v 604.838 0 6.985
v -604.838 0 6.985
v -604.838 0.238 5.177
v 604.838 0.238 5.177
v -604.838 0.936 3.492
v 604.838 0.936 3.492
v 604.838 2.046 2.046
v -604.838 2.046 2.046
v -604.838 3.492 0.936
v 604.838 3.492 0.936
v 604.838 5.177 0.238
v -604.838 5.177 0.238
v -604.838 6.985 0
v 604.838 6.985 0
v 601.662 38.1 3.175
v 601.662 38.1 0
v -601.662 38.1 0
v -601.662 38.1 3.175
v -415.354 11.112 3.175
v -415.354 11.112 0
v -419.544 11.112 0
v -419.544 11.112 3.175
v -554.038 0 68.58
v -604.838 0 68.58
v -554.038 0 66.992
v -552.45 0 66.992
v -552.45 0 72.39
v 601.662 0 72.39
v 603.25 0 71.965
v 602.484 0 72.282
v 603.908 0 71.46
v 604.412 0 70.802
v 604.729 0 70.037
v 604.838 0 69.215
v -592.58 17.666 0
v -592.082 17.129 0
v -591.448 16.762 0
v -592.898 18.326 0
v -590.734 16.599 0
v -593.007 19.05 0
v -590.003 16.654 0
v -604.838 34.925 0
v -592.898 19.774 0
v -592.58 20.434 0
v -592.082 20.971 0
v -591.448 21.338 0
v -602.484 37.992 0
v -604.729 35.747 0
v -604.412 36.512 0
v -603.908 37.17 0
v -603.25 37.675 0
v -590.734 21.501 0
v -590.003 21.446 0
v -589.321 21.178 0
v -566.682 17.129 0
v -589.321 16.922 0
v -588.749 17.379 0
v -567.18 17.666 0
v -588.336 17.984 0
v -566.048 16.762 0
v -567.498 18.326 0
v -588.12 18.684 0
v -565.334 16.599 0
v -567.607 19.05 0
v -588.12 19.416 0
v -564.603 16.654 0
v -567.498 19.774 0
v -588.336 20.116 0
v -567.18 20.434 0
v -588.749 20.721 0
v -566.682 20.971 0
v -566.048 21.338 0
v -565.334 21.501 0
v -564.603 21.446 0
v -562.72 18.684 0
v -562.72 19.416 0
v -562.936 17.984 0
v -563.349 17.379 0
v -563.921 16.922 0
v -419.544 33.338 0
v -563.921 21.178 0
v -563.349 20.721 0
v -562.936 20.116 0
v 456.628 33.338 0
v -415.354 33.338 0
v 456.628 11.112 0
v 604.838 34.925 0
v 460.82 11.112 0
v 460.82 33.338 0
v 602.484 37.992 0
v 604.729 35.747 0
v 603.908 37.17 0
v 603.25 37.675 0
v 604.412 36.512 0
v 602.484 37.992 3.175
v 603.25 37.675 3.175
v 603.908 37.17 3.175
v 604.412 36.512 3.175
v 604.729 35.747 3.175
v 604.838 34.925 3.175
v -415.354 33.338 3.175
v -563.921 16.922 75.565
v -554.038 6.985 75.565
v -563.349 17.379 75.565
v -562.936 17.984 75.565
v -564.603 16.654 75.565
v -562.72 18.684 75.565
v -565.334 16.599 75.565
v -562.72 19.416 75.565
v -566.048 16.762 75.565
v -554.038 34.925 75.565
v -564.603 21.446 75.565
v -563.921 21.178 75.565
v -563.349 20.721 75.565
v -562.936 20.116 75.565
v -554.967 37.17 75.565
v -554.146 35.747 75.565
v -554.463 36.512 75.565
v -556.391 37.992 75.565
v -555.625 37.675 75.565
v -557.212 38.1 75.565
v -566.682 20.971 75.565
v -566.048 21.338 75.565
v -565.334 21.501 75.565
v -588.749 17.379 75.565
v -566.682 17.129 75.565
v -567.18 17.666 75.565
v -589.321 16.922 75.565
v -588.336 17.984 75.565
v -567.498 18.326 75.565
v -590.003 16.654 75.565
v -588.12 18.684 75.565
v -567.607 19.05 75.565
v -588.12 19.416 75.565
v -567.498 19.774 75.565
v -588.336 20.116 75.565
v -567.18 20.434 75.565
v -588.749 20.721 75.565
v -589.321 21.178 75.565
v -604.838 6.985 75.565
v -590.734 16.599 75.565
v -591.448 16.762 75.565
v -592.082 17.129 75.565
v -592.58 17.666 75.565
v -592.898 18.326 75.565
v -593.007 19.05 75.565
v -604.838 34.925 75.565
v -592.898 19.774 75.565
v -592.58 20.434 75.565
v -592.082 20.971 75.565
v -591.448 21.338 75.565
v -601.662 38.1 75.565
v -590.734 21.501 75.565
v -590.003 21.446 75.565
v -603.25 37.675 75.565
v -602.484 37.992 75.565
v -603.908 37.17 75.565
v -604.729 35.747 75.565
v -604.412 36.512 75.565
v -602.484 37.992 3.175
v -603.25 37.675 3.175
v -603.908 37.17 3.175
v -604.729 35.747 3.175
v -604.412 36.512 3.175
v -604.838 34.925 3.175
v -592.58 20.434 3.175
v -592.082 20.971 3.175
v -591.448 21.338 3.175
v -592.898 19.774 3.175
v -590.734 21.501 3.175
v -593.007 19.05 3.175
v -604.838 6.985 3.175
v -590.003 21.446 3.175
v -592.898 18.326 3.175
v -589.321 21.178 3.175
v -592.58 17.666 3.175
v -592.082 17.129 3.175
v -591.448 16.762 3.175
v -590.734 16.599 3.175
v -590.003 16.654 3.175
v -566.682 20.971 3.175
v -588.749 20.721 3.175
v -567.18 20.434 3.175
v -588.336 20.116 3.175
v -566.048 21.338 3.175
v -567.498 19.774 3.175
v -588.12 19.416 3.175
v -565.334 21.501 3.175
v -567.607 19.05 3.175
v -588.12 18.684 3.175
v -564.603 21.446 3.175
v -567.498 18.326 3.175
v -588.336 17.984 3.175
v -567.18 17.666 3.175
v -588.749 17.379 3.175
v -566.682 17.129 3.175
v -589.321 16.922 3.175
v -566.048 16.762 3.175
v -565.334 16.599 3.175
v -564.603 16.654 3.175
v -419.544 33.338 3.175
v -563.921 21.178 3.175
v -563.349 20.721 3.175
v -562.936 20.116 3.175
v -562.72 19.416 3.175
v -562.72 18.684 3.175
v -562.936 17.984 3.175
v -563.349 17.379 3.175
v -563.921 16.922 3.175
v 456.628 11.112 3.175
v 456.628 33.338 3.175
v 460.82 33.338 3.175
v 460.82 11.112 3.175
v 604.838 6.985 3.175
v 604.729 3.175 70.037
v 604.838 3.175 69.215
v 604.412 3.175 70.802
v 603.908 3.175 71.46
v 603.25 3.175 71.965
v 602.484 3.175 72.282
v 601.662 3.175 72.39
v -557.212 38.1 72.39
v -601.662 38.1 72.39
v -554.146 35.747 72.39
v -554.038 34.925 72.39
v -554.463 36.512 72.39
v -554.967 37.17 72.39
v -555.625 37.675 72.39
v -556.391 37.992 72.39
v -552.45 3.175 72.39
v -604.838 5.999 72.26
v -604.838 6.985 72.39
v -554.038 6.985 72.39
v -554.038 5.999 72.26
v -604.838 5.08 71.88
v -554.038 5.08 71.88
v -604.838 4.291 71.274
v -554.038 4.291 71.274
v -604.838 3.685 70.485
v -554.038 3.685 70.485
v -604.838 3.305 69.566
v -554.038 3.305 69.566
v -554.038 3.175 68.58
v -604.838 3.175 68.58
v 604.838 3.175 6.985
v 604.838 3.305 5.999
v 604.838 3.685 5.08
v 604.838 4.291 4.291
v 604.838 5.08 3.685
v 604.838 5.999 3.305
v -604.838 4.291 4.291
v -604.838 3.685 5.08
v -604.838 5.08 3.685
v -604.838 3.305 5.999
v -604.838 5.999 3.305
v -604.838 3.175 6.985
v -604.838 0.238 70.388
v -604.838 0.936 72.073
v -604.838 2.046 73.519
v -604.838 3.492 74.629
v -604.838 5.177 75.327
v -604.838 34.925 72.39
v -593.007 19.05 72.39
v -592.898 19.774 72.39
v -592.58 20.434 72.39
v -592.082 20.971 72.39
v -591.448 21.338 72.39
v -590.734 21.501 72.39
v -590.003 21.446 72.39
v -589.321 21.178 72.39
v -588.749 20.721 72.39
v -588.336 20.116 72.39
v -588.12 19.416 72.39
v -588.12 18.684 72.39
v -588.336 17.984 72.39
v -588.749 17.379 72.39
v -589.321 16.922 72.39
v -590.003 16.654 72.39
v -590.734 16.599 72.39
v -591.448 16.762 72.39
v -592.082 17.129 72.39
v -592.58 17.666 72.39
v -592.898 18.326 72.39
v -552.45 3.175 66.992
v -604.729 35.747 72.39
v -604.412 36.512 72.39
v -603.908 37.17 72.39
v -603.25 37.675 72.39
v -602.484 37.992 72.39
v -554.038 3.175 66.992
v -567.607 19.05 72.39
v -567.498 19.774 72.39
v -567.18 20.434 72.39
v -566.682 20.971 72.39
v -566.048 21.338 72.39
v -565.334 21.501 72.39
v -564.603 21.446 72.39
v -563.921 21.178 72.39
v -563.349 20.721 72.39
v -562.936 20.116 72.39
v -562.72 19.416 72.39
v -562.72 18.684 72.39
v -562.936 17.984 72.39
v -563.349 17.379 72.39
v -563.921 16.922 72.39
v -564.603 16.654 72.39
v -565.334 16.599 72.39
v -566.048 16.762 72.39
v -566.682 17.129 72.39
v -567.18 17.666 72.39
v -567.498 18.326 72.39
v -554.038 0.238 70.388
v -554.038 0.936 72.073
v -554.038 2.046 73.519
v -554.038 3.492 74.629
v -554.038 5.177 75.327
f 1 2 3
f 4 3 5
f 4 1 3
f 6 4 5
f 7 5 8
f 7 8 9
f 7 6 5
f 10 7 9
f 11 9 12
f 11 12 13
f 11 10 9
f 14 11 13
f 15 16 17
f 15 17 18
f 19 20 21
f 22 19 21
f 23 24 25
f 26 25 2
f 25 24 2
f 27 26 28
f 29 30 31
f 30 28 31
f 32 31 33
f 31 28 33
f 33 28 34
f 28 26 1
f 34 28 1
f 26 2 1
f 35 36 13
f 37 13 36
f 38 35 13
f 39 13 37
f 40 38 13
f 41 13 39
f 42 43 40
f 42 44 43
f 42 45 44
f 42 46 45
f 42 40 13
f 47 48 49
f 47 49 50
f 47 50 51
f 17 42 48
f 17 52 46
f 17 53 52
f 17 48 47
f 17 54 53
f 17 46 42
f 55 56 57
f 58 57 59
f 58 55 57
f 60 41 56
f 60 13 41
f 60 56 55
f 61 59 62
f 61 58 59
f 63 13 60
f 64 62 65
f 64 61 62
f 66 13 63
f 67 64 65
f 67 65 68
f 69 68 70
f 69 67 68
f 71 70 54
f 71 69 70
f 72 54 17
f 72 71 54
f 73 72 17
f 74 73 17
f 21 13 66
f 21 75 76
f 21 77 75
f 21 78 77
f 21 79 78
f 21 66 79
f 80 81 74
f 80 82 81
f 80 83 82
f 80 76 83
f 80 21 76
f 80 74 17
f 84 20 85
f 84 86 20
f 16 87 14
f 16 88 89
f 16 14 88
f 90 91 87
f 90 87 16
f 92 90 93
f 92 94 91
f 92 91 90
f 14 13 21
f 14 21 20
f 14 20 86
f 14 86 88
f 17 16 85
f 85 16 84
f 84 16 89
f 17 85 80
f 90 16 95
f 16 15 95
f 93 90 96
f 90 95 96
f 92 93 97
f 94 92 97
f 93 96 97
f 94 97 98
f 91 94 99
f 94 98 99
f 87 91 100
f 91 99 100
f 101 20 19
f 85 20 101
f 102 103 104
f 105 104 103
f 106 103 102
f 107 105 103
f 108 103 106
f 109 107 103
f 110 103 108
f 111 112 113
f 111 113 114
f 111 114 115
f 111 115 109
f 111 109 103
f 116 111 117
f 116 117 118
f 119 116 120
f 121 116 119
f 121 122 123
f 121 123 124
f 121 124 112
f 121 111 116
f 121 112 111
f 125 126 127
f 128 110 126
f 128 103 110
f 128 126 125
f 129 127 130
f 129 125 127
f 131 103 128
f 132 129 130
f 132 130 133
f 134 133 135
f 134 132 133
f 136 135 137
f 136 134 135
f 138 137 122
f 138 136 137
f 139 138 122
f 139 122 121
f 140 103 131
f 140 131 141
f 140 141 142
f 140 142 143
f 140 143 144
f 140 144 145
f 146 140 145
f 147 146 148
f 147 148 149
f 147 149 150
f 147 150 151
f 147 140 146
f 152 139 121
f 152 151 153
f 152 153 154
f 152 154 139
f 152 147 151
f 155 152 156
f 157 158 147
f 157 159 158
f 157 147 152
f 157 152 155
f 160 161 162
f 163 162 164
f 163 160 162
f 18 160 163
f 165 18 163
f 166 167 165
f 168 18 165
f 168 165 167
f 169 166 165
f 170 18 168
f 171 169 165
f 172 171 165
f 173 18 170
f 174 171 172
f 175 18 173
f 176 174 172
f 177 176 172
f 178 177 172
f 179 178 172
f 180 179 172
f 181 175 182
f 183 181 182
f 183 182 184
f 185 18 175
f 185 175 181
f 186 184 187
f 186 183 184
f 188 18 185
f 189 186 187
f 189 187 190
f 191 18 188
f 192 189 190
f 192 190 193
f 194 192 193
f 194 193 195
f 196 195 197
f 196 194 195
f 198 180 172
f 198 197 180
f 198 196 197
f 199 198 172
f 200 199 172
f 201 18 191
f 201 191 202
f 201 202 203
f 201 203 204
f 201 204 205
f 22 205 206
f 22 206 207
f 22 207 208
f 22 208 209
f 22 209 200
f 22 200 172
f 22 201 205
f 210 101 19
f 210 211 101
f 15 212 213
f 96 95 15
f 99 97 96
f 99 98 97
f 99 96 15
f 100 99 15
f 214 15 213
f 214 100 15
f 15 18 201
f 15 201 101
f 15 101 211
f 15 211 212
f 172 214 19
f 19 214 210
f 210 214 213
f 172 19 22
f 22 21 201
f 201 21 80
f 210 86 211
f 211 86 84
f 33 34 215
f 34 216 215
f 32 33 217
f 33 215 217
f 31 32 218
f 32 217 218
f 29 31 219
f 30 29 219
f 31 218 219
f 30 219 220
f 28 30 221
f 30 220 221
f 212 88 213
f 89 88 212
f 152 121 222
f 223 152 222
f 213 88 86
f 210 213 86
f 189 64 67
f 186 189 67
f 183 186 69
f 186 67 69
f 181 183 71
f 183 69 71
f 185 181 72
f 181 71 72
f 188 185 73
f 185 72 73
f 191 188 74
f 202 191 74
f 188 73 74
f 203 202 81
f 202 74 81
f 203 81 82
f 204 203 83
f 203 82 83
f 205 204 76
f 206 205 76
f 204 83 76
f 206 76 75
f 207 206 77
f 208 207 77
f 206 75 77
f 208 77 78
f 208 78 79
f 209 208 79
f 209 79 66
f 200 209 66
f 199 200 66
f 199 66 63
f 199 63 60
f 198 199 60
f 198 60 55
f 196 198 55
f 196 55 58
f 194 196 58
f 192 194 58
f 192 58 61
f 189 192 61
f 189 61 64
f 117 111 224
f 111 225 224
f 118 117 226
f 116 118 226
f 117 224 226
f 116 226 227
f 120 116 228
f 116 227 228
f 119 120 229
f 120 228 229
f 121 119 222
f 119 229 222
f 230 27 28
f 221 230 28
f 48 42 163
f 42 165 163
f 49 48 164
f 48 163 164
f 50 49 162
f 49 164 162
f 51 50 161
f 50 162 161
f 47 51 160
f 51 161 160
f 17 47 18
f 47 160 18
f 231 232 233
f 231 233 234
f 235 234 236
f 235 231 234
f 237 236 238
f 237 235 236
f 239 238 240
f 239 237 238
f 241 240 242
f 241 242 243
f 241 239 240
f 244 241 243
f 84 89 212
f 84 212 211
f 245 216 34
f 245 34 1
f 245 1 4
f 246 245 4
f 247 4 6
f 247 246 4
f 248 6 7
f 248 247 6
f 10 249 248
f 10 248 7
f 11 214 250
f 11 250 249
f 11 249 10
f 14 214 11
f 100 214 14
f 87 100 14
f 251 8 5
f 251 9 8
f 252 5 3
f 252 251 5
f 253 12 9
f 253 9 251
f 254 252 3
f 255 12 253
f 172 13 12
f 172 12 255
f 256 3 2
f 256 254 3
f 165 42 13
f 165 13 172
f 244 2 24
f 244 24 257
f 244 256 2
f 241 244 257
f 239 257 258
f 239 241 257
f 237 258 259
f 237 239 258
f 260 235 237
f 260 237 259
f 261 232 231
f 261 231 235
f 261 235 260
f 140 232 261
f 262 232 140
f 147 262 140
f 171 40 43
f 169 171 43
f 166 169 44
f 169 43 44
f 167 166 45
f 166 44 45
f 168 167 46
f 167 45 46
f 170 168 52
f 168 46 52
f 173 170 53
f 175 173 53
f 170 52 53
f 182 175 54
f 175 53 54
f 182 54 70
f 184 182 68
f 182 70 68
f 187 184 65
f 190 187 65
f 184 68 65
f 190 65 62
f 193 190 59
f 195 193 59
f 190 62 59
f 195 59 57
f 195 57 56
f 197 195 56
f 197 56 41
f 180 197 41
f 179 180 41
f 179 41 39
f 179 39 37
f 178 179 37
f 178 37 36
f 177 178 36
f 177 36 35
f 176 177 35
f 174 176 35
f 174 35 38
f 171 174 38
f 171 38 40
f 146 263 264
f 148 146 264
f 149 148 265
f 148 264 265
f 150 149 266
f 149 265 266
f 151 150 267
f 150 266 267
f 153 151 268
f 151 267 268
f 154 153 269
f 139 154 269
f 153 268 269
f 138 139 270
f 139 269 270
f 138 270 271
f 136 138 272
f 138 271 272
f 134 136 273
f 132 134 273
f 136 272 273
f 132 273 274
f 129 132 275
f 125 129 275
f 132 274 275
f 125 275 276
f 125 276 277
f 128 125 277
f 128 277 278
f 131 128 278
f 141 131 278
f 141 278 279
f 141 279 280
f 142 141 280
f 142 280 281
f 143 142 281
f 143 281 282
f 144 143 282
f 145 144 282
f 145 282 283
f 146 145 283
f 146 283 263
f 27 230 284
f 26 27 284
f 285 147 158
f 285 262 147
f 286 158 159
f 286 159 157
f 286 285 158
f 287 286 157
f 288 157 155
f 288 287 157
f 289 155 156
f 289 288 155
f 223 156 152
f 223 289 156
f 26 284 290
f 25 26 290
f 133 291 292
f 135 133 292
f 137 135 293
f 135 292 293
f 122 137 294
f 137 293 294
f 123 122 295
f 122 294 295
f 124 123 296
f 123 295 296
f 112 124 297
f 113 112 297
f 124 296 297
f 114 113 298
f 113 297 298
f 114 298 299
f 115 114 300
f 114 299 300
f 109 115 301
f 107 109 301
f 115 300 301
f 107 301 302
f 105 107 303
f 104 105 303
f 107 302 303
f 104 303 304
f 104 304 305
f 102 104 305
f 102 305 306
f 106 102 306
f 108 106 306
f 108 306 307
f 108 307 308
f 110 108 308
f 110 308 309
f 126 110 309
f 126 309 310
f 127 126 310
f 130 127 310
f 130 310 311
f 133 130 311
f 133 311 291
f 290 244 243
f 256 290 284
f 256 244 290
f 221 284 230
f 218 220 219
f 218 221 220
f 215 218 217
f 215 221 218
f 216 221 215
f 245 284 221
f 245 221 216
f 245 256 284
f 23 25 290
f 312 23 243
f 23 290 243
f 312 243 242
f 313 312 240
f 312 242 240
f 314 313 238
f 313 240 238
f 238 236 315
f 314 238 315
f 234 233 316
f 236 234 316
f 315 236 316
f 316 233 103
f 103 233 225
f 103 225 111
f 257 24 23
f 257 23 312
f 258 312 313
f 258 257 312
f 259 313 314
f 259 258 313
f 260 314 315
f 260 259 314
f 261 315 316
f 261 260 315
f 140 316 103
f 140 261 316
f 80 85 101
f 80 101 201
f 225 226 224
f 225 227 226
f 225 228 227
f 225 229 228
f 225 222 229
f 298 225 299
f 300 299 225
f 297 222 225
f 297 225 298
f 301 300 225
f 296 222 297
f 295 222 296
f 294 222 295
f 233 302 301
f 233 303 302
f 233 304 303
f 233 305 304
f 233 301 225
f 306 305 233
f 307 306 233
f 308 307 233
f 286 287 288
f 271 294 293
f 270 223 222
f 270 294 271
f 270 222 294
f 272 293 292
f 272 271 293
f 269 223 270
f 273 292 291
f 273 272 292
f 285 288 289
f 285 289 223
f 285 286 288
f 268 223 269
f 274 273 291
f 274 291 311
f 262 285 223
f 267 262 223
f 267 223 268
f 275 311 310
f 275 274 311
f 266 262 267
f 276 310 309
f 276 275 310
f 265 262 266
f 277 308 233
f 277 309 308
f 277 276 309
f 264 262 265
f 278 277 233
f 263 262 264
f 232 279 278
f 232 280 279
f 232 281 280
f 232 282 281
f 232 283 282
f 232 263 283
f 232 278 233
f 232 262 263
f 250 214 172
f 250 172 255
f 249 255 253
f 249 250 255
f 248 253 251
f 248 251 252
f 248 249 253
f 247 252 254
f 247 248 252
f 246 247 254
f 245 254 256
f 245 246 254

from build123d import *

# Parameters (mm, degrees)
SKETCH1_W                     = 1209.675
SKETCH1_H                     = 72.39
BASE_FLANGE1_DEPTH            = 3.175
EDGE_FLANGE1_STRIP_W          = 20.32
EDGE_FLANGE1_STRIP_H          = 3.175
EDGE_FLANGE1_STRIP_CUT_DEPTH  = 1209.675
EDGE_FLANGE1_DEPTH            = 1209.675
SKETCH10_W                    = 4.191
SKETCH10_H                    = 22.225
CUT_EXTRUDE2_DEPTH            = 611.344430225
EDGE_FLANGE2_STRIP_W          = 20.32
EDGE_FLANGE2_STRIP_H          = 3.175
EDGE_FLANGE2_STRIP_CUT_DEPTH  = 50.8
EDGE_FLANGE2_RELIEF_W         = 21.9075
EDGE_FLANGE2_RELIEF_H         = 1.5875
EDGE_FLANGE2_RELIEF_CUT_DEPTH = 3.175
EDGE_FLANGE2_DEPTH            = 50.8
F_10_0_1935_DIAMETER_HOLE1_D  = 4.9149
FILLET1_R                     = 3.175
LPATTERN1_COUNT               = 2
LPATTERN1_PITCH               = 876.173


# Sheet-metal steps are written as plain solids
with BuildPart() as part:
    # Sketch1 → Base-Flange1 (new body)
    with BuildSketch(Plane(origin=(0, 0, 0), x_dir=(1, 0, 0), z_dir=(0, 1, 0))):
        with Locations((0, -36.195)):
            Rectangle(SKETCH1_W, SKETCH1_H)
    extrude(amount=BASE_FLANGE1_DEPTH)

    # Edge-Flange1 strip (across the edge) → Edge-Flange1 strip cut (cut)
    with BuildSketch(Plane(origin=(604.8375, 3.175, 0), x_dir=(0, 0, 1), z_dir=(-1, 0, 0))):
        with Locations((-3.175, -1.5875)):
            Rectangle(EDGE_FLANGE1_STRIP_W, EDGE_FLANGE1_STRIP_H)
    extrude(amount=EDGE_FLANGE1_STRIP_CUT_DEPTH, mode=Mode.SUBTRACT)

    # Edge-Flange1 section (across the edge) → Edge-Flange1 (add)
    with BuildSketch(Plane(origin=(604.8375, 3.175, 0), x_dir=(0, 0, 1), z_dir=(-1, 0, 0))):
        with BuildLine():
            Line((0, 3.81), (0, 34.925))
            Line((0, 34.925), (3.175, 34.925))
            Line((3.175, 34.925), (3.175, 3.81))
            ThreePointArc((3.175, 3.81), (4.290923164, 1.115923164), (6.985, 0))
            Line((6.985, 0), (6.985, -3.175))
            ThreePointArc((6.985, -3.175), (2.045859133, -1.129140867), (0, 3.81))
        make_face()
    extrude(amount=EDGE_FLANGE1_DEPTH)

    # Sketch10 → Cut-Extrude2 (cut, through all)
    with BuildSketch(Plane(origin=(0, 0, 0), x_dir=(-1, 0, 0), z_dir=(0, 0, -1))):
        with Locations((417.449, 22.225)):
            Rectangle(SKETCH10_W, SKETCH10_H)
    cut_extrude2 = extrude(amount=-CUT_EXTRUDE2_DEPTH, mode=Mode.SUBTRACT)

    # Edge-Flange2 strip (across the edge) → Edge-Flange2 strip cut (cut)
    with BuildSketch(Plane(origin=(-604.8375, 3.175, 72.39), x_dir=(0, 0, -1), z_dir=(1, 0, 0))):
        with Locations((-6.35, -1.5875)):
            Rectangle(EDGE_FLANGE2_STRIP_W, EDGE_FLANGE2_STRIP_H)
    extrude(amount=EDGE_FLANGE2_STRIP_CUT_DEPTH, mode=Mode.SUBTRACT)

    # Edge-Flange2 relief (on the sheet) → Edge-Flange2 relief cut (cut)
    with BuildSketch(Plane(origin=(-604.8375, 3.175, 68.58), x_dir=(0, 0, -1), z_dir=(0, 1, 0))):
        with Locations((-9.36625, -51.59375)):
            Rectangle(EDGE_FLANGE2_RELIEF_W, EDGE_FLANGE2_RELIEF_H)
    extrude(amount=-EDGE_FLANGE2_RELIEF_CUT_DEPTH, mode=Mode.SUBTRACT)

    # Edge-Flange2 section (across the edge) → Edge-Flange2 (add)
    with BuildSketch(Plane(origin=(-604.8375, 3.175, 72.39), x_dir=(0, 0, -1), z_dir=(1, 0, 0))):
        with BuildLine():
            Line((-3.175, 3.81), (-3.175, 34.925))
            Line((-3.175, 34.925), (0, 34.925))
            Line((0, 34.925), (0, 3.81))
            ThreePointArc((0, 3.81), (1.115923164, 1.115923164), (3.81, 0))
            Line((3.81, 0), (3.81, -3.175))
            ThreePointArc((3.81, -3.175), (-1.129140867, -1.129140867), (-3.175, 3.81))
        make_face()
    extrude(amount=EDGE_FLANGE2_DEPTH)

    # #10 (0.1935) Diameter Hole1 (through all)
    with Locations(Plane.XY.offset(75.565)):
        with Locations((-565.15, 19.05), (-590.55, 19.05)):
            Hole(F_10_0_1935_DIAMETER_HOLE1_D / 2)

    # Fillet1
    fillet1_edges = [part.edges().sort_by_distance(p)[0] for p in [
        (-604.8375, 38.1, 73.9775),
        (-554.0375, 38.1, 73.9775),
        (604.8375, 38.1, 1.5875),
        (-604.8375, 38.1, 1.5875),
        (604.8375, 1.5875, 72.39),
    ]]
    fillet(fillet1_edges, radius=FILLET1_R)

    # LPattern1: Cut-Extrude2 ×2
    with Locations(*[(i * LPATTERN1_PITCH, 0, 0) for i in range(1, LPATTERN1_COUNT)]):
        add(cut_extrude2, mode=Mode.SUBTRACT)


solid = part.part
